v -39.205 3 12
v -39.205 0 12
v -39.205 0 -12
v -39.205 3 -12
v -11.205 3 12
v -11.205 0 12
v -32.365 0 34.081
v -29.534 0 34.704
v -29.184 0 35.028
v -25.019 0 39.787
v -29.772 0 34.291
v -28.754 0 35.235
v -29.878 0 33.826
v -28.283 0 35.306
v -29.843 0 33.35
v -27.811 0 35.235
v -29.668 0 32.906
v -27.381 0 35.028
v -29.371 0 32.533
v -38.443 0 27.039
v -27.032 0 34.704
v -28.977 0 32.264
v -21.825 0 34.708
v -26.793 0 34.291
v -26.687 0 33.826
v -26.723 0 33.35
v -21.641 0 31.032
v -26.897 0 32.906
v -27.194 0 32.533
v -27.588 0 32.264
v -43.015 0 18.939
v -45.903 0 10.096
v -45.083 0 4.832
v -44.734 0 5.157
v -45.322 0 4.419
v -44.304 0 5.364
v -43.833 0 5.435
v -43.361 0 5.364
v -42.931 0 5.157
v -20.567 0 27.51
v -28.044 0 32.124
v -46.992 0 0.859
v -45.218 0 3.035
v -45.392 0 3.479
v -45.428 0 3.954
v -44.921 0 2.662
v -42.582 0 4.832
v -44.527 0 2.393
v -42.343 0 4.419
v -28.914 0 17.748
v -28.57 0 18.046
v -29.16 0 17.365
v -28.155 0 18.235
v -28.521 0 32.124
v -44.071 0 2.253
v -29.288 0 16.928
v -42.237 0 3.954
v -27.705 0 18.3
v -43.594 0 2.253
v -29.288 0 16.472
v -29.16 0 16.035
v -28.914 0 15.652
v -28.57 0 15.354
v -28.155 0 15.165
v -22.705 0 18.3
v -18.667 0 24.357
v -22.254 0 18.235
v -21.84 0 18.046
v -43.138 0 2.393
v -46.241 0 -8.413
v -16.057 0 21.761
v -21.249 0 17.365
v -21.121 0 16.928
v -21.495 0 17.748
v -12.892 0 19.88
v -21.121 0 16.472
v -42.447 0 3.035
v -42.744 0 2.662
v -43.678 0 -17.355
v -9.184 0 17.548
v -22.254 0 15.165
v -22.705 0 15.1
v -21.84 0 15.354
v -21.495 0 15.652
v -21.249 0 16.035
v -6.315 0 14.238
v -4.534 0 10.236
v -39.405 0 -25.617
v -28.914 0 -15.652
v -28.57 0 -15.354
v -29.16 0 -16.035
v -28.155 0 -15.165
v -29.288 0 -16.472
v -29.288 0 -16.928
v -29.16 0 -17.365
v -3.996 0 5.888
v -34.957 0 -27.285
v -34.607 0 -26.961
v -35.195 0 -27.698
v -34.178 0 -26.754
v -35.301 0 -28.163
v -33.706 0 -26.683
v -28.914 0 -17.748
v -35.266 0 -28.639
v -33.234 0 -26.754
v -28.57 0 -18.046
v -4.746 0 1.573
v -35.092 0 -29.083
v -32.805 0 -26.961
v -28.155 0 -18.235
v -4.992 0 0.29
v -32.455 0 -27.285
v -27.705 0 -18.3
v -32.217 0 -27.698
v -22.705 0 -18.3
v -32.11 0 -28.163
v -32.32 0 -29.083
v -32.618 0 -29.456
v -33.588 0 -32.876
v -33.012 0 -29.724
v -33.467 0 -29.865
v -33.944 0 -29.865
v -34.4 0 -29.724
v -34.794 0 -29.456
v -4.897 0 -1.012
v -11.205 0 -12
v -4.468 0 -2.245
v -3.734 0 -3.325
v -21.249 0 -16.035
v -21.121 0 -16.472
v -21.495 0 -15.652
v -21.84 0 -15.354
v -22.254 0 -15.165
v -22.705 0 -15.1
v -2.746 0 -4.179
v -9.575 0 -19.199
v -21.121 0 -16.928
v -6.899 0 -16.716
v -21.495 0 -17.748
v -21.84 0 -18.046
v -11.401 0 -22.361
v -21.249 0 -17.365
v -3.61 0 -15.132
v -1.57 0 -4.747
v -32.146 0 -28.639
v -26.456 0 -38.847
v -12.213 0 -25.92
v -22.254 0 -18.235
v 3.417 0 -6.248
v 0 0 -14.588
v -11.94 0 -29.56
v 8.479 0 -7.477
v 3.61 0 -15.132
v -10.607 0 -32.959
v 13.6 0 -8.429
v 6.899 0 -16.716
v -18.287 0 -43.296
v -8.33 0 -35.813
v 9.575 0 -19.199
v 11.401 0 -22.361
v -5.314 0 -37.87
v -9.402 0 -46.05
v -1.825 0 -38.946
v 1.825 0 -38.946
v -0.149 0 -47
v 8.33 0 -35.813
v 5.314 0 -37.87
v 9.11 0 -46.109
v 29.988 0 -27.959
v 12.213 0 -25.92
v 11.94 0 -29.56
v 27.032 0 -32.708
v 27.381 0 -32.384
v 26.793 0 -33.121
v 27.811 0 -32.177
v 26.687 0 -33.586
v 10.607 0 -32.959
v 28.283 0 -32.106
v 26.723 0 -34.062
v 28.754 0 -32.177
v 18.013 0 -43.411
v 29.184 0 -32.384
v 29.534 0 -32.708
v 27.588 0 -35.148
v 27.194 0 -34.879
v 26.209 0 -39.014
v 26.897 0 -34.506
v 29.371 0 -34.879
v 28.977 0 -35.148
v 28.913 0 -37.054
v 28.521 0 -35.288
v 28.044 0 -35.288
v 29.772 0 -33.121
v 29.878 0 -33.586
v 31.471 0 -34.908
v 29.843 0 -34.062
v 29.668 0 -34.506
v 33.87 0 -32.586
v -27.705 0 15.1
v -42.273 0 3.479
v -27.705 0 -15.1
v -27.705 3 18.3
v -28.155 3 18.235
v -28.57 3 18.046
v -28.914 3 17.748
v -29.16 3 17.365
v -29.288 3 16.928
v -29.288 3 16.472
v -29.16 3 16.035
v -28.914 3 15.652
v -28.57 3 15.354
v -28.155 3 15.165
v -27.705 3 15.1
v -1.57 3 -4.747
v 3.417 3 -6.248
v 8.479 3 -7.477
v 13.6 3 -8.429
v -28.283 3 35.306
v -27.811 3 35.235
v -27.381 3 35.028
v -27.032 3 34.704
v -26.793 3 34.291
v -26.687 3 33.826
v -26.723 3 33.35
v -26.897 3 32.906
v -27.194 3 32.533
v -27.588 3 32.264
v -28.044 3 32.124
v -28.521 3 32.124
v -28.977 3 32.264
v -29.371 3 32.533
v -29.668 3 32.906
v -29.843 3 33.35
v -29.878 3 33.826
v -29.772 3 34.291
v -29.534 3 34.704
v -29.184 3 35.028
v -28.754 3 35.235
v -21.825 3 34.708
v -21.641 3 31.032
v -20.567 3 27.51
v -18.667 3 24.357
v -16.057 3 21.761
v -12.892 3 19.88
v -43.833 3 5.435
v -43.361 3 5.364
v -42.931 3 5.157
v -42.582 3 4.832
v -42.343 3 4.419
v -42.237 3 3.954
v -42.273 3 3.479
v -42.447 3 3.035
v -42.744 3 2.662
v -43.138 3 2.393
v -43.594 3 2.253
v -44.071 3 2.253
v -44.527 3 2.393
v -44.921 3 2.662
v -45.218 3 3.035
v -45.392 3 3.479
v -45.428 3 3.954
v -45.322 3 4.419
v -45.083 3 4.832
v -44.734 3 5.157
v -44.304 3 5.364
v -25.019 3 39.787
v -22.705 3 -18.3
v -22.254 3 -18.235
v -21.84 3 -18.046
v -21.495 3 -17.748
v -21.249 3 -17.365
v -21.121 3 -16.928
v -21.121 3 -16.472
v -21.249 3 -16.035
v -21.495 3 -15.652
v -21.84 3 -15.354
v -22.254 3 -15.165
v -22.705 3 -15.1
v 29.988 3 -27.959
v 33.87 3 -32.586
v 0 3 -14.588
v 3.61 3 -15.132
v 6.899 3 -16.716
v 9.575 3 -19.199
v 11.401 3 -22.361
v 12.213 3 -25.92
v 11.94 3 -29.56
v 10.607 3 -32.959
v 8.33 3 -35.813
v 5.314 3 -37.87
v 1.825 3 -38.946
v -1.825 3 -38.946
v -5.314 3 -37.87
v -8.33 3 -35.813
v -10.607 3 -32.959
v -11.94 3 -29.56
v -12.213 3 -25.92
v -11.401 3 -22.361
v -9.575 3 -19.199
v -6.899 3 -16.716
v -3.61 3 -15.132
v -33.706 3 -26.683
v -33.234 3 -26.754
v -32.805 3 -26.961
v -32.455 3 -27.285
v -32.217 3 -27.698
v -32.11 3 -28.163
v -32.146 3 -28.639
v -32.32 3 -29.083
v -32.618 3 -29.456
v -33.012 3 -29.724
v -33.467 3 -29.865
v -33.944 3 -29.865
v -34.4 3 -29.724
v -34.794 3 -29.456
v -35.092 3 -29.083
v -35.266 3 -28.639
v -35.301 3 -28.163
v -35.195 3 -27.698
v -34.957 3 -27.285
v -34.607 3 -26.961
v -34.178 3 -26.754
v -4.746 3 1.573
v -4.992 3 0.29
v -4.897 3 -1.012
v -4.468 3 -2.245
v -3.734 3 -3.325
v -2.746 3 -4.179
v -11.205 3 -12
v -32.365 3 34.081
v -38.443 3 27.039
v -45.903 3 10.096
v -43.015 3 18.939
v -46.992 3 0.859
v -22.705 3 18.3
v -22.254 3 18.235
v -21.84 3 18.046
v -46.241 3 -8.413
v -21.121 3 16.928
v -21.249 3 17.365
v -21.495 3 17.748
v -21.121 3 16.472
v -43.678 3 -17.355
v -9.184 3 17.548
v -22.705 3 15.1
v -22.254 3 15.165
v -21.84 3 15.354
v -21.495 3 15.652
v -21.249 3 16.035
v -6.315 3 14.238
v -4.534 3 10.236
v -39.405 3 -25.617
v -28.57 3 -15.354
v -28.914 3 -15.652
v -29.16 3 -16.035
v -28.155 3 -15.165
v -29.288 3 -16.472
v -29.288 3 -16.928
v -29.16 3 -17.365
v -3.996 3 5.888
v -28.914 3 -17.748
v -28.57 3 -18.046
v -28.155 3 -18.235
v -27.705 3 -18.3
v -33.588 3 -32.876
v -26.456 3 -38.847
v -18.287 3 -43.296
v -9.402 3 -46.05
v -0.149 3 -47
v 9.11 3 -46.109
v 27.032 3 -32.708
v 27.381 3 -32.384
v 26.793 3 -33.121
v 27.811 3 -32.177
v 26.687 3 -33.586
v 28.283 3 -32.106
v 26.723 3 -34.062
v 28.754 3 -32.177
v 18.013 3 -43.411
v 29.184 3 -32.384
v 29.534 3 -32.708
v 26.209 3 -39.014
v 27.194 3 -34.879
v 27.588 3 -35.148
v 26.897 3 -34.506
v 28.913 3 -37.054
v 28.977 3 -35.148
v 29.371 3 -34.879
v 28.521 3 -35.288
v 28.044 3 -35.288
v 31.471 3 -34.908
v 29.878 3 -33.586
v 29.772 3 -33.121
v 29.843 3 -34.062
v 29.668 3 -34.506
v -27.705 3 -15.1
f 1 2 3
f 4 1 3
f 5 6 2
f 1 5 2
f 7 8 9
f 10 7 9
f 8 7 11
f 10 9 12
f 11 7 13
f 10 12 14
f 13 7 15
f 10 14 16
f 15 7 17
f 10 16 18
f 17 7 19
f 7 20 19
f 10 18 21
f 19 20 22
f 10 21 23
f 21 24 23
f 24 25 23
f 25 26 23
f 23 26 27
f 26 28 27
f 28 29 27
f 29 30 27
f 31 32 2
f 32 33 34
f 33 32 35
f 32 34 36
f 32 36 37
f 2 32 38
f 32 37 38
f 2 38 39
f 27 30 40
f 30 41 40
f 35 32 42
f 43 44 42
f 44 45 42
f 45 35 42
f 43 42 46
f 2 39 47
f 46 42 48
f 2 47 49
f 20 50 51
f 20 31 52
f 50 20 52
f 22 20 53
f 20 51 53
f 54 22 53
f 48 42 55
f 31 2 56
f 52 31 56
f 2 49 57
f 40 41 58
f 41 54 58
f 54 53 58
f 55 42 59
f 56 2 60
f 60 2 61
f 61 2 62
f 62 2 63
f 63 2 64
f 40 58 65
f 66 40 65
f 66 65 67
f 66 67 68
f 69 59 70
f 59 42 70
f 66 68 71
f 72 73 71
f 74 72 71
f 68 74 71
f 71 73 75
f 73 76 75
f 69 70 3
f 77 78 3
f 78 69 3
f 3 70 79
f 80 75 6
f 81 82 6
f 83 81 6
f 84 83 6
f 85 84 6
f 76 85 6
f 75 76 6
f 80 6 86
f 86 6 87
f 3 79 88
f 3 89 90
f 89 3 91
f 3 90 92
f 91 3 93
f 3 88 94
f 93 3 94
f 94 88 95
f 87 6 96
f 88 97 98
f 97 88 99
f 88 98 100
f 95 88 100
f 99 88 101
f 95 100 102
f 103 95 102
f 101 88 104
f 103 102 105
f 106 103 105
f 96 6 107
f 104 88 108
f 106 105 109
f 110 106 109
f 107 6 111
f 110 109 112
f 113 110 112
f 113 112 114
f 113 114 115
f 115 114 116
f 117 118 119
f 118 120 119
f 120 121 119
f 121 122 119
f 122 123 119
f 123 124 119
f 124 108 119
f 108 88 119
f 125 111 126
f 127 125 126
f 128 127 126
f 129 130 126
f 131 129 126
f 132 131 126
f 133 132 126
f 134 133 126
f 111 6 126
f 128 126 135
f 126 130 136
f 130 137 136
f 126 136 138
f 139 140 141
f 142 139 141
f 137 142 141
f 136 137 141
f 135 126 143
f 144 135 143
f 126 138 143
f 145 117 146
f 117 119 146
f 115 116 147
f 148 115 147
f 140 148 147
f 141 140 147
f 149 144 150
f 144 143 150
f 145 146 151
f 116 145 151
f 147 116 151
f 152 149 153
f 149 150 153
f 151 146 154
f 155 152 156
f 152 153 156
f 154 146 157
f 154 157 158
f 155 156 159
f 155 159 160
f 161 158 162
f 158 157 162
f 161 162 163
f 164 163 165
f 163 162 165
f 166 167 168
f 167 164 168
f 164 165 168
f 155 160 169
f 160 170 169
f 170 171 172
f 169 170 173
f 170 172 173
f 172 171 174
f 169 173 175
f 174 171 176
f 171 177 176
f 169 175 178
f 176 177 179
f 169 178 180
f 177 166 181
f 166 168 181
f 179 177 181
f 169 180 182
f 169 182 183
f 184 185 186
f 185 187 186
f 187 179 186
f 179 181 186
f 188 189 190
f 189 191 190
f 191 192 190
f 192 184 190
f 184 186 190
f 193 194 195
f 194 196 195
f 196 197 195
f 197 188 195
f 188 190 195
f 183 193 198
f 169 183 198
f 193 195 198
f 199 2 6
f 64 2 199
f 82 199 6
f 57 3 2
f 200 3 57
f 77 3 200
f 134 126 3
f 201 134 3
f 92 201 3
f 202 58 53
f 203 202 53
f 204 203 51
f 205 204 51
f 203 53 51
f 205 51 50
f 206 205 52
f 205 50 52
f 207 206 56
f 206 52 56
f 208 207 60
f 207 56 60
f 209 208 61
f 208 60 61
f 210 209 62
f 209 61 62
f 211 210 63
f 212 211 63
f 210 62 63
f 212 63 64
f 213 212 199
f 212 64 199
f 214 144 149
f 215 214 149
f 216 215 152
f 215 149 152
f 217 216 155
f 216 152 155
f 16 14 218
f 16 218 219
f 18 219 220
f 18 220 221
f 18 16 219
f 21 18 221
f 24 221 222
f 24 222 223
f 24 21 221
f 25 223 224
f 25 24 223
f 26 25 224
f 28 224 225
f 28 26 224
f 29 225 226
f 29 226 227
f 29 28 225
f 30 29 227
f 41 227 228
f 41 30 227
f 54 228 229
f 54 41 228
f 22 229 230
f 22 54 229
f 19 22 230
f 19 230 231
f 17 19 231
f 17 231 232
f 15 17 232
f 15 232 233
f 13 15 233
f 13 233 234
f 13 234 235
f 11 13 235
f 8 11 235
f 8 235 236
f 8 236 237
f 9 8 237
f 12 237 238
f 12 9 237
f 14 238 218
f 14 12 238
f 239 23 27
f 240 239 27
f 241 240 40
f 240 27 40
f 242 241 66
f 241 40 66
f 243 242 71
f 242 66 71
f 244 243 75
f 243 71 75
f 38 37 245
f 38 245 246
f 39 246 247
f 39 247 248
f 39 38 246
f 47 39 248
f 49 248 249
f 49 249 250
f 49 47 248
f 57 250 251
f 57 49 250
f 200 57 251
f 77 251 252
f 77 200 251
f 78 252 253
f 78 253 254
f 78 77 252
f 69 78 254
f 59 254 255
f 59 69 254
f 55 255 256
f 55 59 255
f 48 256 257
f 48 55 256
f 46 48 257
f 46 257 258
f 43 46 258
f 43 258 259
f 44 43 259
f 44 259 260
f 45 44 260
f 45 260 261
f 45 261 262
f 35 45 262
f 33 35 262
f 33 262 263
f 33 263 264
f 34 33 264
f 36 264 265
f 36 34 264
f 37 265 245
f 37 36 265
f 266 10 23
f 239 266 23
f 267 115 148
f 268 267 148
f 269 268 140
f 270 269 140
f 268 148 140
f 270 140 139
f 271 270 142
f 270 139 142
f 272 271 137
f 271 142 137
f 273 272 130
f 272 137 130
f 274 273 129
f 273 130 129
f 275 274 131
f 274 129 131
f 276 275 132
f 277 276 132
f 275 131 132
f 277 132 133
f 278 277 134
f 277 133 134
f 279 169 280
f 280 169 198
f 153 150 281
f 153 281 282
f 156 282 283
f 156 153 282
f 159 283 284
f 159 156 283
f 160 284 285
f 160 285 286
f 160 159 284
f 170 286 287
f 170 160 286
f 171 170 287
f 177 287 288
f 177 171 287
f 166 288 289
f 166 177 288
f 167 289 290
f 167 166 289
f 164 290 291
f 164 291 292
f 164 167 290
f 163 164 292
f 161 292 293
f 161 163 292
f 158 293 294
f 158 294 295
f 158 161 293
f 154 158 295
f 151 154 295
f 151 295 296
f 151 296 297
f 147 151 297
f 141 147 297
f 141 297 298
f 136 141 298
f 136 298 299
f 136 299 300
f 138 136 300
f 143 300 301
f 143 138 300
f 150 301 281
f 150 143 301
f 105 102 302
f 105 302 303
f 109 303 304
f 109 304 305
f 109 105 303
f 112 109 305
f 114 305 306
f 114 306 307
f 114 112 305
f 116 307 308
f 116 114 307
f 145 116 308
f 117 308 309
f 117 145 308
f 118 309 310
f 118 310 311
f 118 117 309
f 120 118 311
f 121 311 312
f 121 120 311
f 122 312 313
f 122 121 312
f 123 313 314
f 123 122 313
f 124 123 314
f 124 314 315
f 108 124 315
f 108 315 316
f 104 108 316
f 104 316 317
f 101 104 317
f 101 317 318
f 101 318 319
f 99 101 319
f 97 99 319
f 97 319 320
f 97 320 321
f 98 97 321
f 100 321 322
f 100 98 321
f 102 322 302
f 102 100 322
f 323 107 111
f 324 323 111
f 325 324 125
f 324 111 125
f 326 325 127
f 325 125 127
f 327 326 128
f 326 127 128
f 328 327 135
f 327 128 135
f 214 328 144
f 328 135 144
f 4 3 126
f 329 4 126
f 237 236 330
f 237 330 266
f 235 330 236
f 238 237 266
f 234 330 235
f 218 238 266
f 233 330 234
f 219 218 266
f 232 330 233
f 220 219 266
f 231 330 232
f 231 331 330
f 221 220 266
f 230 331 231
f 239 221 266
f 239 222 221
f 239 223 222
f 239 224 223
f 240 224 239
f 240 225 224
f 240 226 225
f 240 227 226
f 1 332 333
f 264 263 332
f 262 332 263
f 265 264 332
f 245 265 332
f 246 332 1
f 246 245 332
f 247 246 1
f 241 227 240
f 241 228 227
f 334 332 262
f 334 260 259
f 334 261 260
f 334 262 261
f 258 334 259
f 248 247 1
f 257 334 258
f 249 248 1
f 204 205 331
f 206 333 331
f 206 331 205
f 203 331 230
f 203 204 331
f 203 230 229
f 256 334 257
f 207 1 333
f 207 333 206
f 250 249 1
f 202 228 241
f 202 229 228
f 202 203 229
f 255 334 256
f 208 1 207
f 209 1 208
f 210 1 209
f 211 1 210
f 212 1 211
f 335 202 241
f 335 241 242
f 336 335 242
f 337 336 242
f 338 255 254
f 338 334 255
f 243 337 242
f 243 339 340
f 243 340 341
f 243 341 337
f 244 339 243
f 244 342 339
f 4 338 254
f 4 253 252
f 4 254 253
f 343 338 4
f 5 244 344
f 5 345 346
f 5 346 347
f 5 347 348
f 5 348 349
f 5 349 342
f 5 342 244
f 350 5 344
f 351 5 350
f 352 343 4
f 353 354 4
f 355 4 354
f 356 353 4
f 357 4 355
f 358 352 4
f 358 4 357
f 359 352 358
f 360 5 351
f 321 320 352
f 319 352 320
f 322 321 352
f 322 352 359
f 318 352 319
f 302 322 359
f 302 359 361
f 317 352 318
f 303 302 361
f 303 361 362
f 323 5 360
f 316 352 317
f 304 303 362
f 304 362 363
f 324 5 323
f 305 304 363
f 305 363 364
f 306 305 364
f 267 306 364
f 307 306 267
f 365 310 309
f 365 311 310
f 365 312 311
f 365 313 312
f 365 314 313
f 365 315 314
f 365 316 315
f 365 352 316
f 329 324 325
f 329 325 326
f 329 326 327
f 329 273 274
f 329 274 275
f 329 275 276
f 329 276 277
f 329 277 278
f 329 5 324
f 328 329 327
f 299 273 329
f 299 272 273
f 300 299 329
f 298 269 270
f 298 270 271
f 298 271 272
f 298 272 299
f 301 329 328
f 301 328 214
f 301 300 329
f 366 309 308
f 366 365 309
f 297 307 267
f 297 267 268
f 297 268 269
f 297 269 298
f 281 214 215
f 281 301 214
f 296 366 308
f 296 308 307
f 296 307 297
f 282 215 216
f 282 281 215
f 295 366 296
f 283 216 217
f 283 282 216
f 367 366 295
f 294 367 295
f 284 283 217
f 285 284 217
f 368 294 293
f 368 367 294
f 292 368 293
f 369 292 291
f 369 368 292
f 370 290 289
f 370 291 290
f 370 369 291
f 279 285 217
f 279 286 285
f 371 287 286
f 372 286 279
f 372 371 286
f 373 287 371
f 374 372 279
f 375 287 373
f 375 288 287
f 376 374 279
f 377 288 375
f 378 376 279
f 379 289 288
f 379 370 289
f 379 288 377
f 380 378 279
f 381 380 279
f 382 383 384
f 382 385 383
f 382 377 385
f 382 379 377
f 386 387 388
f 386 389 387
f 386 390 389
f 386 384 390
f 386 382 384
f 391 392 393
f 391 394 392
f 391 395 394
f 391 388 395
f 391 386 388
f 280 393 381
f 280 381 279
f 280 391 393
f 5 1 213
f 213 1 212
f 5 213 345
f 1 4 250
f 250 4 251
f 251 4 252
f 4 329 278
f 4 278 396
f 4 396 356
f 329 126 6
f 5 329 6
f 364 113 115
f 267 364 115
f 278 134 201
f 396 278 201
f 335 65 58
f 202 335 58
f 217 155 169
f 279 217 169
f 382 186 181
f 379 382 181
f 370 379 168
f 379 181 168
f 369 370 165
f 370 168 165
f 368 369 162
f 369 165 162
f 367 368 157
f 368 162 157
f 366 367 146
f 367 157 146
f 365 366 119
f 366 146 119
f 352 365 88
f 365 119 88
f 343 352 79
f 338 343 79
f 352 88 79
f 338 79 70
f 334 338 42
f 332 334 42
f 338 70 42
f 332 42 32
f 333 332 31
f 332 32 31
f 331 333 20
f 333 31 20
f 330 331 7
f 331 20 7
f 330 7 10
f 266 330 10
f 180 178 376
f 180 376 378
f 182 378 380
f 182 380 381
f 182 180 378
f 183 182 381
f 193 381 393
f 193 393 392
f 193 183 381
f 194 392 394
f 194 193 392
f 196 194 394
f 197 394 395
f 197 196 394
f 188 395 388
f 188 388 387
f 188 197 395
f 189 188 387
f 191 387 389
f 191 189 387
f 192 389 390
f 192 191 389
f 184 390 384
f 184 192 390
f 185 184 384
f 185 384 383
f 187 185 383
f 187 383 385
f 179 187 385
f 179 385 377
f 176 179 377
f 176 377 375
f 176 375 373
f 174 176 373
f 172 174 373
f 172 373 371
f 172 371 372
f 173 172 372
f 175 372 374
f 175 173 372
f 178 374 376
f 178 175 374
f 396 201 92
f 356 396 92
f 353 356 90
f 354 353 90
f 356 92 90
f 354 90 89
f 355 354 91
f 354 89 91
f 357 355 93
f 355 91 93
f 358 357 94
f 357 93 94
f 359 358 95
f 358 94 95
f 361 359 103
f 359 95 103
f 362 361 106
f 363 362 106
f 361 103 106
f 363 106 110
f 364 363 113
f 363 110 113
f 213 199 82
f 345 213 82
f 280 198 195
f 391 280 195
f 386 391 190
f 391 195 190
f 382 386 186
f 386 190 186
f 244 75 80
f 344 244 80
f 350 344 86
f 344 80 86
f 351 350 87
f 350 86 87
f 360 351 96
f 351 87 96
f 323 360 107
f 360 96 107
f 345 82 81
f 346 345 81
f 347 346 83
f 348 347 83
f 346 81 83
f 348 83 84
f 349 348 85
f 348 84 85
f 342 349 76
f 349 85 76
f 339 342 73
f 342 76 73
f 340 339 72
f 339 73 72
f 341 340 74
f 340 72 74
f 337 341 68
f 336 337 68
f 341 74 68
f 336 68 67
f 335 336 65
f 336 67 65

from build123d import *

# Parameters (mm, degrees)
SKETCH1_R           = 12.247413434
SKETCH1_R_2         = 1.6
BOSS_EXTRUDE1_DEPTH = 3


with BuildPart() as part:
    # Sketch1 → Boss-Extrude1 (new body)
    # profile 1 of 4: a face of its own
    with BuildSketch(Plane(origin=(0, 0, 0), x_dir=(1, 0, 0), z_dir=(0, 1, 0))):
        with BuildLine():
            ThreePointArc((-1.570198622, 4.747049219), (5.939862085, 6.896641641), (13.599748073, 8.42892949))
            Line((13.599748073, 8.42892949), (29.987808283, 27.959459121))
            Line((29.987808283, 27.959459121), (33.869799276, 32.585835834))
            ThreePointArc((33.869799276, 32.585835834), (30.211017655, 36.004088827), (26.209354845, 39.013711931))
            Line((26.209354845, 39.013711931), (22.327363852, 34.387335218))
            ThreePointArc((22.327363852, 34.387335218), (-14.018145326, 38.529100711), (-39.204591568, 12))
            Line((-39.204591568, 12), (-11.204591568, 12))
            Line((-11.204591568, 12), (-11.204591568, -12))
            Line((-11.204591568, -12), (-39.204591568, -12))
            ThreePointArc((-39.204591568, -12), (-32.558798287, -24.918359779), (-21.825227783, -34.708204106))
            ThreePointArc((-21.825227783, -34.708204106), (-19.713839088, -25.875293038), (-12.892481496, -19.879681247))
            ThreePointArc((-12.892481496, -19.879681247), (-5.276324008, -12.302707641), (-4.746257371, -1.572590527))
            ThreePointArc((-4.746257371, -1.572590527), (-4.467534634, 2.245247045), (-1.570198622, 4.747049219))
        make_face()
        with BuildLine():
            Line((-22.704591568, -18.3), (-27.704591568, -18.3))
            ThreePointArc((-27.704591568, -18.3), (-29.304591568, -16.7), (-27.704591568, -15.1))
            Line((-27.704591568, -15.1), (-22.704591568, -15.1))
            ThreePointArc((-22.704591568, -15.1), (-21.104591568, -16.7), (-22.704591568, -18.3))
        make_face(mode=Mode.SUBTRACT)
        with BuildLine():
            ThreePointArc((-27.704591568, 15.1), (-29.304591568, 16.7), (-27.704591568, 18.3))
            Line((-27.704591568, 18.3), (-22.704591568, 18.3))
            ThreePointArc((-22.704591568, 18.3), (-21.104591568, 16.7), (-22.704591568, 15.1))
            Line((-22.704591568, 15.1), (-27.704591568, 15.1))
        make_face(mode=Mode.SUBTRACT)
        with Locations(Location((0, 26.835034763, 0), (0, 0, 270))):
            Circle(SKETCH1_R, mode=Mode.SUBTRACT)
        with Locations(Location((28.282654826, 33.705955497, 0), (0, 0, 270))):
            Circle(SKETCH1_R_2, mode=Mode.SUBTRACT)
    # profile 2 of 4: a face of its own
    with BuildSketch(Plane(origin=(0, 0, 0), x_dir=(1, 0, 0), z_dir=(0, 1, 0))):
        with BuildLine():
            Line((-25.019163556, -39.787453487), (-21.825227783, -34.708204106))
            ThreePointArc((-21.825227783, -34.708204106), (-32.558798287, -24.918359779), (-39.204591568, -12))
            ThreePointArc((-39.204591568, -12), (-41, 0), (-39.204591568, 12))
            ThreePointArc((-39.204591568, 12), (-14.018145326, 38.529100711), (22.327363852, 34.387335218))
            Line((22.327363852, 34.387335218), (26.209354845, 39.013711931))
            ThreePointArc((26.209354845, 39.013711931), (-39.405076534, 25.617180629), (-25.019163556, -39.787453487))
        make_face()
        with Locations(Location((-28.282654826, -33.705955497, 0), (0, 0, 270))):
            Circle(SKETCH1_R_2, mode=Mode.SUBTRACT)
        with Locations(Location((-43.832566716, -3.834852681, 0), (0, 0, 270))):
            Circle(SKETCH1_R_2, mode=Mode.SUBTRACT)
        with Locations(Location((-33.705955497, 28.282654826, 0), (0, 0, 270))):
            Circle(SKETCH1_R_2, mode=Mode.SUBTRACT)
    # profile 3 of 4: a face of its own
    with BuildSketch(Plane(origin=(0, 0, 0), x_dir=(1, 0, 0), z_dir=(0, 1, 0))):
        with BuildLine():
            ThreePointArc((-39.204591568, 12), (-41, 0), (-39.204591568, -12))
            Line((-39.204591568, -12), (-39.204591568, 12))
        make_face()
    # profile 4 of 4: a face of its own
    with BuildSketch(Plane(origin=(0, 0, 0), x_dir=(1, 0, 0), z_dir=(0, 1, 0))):
        with BuildLine():
            ThreePointArc((-1.570198622, 4.747049219), (5.939862085, 6.896641641), (13.599748073, 8.42892949))
            Line((13.599748073, 8.42892949), (29.987808283, 27.959459121))
            Line((29.987808283, 27.959459121), (33.869799276, 32.585835834))
            ThreePointArc((33.869799276, 32.585835834), (30.211017655, 36.004088827), (26.209354845, 39.013711931))
            Line((26.209354845, 39.013711931), (22.327363852, 34.387335218))
            ThreePointArc((22.327363852, 34.387335218), (-14.018145326, 38.529100711), (-39.204591568, 12))
            Line((-39.204591568, 12), (-11.204591568, 12))
            Line((-11.204591568, 12), (-11.204591568, -12))
            Line((-11.204591568, -12), (-39.204591568, -12))
            ThreePointArc((-39.204591568, -12), (-32.558798287, -24.918359779), (-21.825227783, -34.708204106))
            ThreePointArc((-21.825227783, -34.708204106), (-19.713839088, -25.875293038), (-12.892481496, -19.879681247))
            ThreePointArc((-12.892481496, -19.879681247), (-5.276324008, -12.302707641), (-4.746257371, -1.572590527))
            ThreePointArc((-4.746257371, -1.572590527), (-4.467534634, 2.245247045), (-1.570198622, 4.747049219))
        make_face()
        with BuildLine():
            Line((-22.704591568, -18.3), (-27.704591568, -18.3))
            ThreePointArc((-27.704591568, -18.3), (-29.304591568, -16.7), (-27.704591568, -15.1))
            Line((-27.704591568, -15.1), (-22.704591568, -15.1))
            ThreePointArc((-22.704591568, -15.1), (-21.104591568, -16.7), (-22.704591568, -18.3))
        make_face(mode=Mode.SUBTRACT)
        with BuildLine():
            ThreePointArc((-27.704591568, 15.1), (-29.304591568, 16.7), (-27.704591568, 18.3))
            Line((-27.704591568, 18.3), (-22.704591568, 18.3))
            ThreePointArc((-22.704591568, 18.3), (-21.104591568, 16.7), (-22.704591568, 15.1))
            Line((-22.704591568, 15.1), (-27.704591568, 15.1))
        make_face(mode=Mode.SUBTRACT)
        with Locations(Location((0, 26.835034763, 0), (0, 0, 270))):
            Circle(SKETCH1_R, mode=Mode.SUBTRACT)
        with Locations(Location((28.282654826, 33.705955497, 0), (0, 0, 270))):
            Circle(SKETCH1_R_2, mode=Mode.SUBTRACT)
    extrude(amount=BOSS_EXTRUDE1_DEPTH)


solid = part.part
